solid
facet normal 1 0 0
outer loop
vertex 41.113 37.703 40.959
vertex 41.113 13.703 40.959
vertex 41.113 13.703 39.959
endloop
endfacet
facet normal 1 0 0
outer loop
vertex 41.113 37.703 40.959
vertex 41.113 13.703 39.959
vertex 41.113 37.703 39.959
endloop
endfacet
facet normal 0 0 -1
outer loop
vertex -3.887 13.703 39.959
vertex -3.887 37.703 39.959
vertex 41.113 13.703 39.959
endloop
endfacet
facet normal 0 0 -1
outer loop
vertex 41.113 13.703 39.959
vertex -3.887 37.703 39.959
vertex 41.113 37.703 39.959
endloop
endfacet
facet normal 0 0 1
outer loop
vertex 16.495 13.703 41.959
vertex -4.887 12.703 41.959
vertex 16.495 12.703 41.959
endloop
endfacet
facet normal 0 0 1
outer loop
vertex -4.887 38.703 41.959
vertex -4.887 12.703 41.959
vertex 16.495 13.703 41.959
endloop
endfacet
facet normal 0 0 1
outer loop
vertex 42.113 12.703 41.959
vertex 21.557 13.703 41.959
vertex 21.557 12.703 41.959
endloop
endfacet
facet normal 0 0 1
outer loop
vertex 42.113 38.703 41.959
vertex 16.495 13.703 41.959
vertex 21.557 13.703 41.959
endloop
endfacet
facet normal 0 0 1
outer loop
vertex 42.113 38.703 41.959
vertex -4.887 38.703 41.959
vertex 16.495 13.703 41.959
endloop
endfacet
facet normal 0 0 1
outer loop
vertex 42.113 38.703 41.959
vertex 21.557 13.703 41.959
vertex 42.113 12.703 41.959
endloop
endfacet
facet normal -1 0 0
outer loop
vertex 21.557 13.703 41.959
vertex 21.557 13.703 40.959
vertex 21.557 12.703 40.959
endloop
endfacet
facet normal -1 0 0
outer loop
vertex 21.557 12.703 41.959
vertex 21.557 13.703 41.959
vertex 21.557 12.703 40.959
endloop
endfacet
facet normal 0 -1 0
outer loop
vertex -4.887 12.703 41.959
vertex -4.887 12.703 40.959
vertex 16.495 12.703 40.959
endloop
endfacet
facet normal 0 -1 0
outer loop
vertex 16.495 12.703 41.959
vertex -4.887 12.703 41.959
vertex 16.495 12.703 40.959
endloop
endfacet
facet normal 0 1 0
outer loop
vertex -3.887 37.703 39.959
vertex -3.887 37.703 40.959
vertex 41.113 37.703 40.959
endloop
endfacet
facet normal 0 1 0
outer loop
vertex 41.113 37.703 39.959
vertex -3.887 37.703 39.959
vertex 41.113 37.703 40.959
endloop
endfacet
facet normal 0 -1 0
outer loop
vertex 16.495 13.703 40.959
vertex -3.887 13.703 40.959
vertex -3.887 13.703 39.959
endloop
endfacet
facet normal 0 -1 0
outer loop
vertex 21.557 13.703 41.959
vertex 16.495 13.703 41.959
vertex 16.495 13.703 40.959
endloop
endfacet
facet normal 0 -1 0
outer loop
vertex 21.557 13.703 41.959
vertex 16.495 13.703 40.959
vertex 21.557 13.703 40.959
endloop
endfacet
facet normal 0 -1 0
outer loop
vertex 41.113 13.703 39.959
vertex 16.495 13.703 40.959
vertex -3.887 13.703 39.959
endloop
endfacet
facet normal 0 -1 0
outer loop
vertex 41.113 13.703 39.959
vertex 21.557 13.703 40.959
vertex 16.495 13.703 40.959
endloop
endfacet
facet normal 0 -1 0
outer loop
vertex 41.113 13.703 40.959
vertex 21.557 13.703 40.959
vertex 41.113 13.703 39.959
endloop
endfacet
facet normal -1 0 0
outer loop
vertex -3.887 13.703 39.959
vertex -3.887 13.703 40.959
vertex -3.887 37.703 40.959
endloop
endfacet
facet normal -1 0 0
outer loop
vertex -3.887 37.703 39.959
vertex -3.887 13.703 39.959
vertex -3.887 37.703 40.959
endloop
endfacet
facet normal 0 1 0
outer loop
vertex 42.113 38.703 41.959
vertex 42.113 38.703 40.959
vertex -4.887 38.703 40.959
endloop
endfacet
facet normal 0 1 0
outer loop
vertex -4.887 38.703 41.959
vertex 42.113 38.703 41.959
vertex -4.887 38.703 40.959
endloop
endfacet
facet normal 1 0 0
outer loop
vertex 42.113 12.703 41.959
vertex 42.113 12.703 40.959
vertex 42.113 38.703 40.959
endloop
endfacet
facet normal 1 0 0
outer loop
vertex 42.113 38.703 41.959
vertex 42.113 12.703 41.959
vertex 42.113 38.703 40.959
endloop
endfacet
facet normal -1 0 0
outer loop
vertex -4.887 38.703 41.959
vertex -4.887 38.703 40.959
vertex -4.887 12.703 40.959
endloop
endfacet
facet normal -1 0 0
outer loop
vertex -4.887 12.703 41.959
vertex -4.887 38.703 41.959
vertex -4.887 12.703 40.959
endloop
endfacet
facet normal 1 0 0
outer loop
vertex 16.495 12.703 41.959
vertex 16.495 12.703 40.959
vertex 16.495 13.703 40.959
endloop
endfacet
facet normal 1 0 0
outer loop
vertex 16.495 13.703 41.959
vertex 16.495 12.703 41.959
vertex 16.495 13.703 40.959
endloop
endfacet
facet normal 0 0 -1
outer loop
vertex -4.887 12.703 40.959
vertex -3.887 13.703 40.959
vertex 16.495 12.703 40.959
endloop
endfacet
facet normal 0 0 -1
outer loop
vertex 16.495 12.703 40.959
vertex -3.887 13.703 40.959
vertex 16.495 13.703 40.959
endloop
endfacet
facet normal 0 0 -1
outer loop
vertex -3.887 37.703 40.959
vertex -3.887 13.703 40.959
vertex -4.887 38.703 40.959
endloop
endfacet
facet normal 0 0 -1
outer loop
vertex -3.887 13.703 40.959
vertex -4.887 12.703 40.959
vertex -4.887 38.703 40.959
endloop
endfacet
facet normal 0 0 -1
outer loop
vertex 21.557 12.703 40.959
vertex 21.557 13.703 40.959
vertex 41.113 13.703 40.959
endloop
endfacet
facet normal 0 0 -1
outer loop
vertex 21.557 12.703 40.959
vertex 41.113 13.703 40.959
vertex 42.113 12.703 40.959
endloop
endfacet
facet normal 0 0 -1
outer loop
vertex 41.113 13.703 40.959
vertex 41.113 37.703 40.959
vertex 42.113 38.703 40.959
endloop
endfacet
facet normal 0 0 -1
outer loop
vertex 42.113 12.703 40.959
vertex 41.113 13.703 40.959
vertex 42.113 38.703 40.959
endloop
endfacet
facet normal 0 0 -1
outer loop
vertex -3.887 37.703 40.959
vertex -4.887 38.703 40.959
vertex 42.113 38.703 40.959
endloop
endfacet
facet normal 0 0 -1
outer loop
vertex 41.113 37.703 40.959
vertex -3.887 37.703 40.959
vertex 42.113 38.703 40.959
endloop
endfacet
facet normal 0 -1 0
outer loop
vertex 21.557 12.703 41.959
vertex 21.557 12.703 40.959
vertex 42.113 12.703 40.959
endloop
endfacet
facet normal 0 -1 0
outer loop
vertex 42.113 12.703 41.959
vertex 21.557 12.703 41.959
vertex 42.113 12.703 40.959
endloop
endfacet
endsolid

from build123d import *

# Parameters (mm, degrees)
BOSS_EXTRUDE1_DEPTH = 1
SKETCH2_W           = 45
SKETCH2_H           = 24
BOSS_EXTRUDE2_DEPTH = 2


with BuildPart() as part:
    # Sketch1 → Boss-Extrude1 (new body)
    with BuildSketch(Plane.XY.offset(40.959042005)):
        Polygon((16.495104543, 13.703029386), (-3.886901765, 13.703029386), (-3.886901765, 37.703029386), (41.113098235, 37.703029386), (41.113098235, 13.703029386), (21.556960057, 13.703029386), (21.556960057, 12.703029386), (42.113098235, 12.703029386), (42.113098235, 38.703029386), (-4.886901765, 38.703029386), (-4.886901765, 12.703029386), (16.495104543, 12.703029386), align=None)
    extrude(amount=BOSS_EXTRUDE1_DEPTH)

    # Sketch2 → Boss-Extrude2 (add)
    with BuildSketch(Plane.XY.offset(41.959042005)):
        with Locations((18.613098235, 25.703029386)):
            Rectangle(SKETCH2_W, SKETCH2_H)
    extrude(amount=-BOSS_EXTRUDE2_DEPTH)


solid = part.part
